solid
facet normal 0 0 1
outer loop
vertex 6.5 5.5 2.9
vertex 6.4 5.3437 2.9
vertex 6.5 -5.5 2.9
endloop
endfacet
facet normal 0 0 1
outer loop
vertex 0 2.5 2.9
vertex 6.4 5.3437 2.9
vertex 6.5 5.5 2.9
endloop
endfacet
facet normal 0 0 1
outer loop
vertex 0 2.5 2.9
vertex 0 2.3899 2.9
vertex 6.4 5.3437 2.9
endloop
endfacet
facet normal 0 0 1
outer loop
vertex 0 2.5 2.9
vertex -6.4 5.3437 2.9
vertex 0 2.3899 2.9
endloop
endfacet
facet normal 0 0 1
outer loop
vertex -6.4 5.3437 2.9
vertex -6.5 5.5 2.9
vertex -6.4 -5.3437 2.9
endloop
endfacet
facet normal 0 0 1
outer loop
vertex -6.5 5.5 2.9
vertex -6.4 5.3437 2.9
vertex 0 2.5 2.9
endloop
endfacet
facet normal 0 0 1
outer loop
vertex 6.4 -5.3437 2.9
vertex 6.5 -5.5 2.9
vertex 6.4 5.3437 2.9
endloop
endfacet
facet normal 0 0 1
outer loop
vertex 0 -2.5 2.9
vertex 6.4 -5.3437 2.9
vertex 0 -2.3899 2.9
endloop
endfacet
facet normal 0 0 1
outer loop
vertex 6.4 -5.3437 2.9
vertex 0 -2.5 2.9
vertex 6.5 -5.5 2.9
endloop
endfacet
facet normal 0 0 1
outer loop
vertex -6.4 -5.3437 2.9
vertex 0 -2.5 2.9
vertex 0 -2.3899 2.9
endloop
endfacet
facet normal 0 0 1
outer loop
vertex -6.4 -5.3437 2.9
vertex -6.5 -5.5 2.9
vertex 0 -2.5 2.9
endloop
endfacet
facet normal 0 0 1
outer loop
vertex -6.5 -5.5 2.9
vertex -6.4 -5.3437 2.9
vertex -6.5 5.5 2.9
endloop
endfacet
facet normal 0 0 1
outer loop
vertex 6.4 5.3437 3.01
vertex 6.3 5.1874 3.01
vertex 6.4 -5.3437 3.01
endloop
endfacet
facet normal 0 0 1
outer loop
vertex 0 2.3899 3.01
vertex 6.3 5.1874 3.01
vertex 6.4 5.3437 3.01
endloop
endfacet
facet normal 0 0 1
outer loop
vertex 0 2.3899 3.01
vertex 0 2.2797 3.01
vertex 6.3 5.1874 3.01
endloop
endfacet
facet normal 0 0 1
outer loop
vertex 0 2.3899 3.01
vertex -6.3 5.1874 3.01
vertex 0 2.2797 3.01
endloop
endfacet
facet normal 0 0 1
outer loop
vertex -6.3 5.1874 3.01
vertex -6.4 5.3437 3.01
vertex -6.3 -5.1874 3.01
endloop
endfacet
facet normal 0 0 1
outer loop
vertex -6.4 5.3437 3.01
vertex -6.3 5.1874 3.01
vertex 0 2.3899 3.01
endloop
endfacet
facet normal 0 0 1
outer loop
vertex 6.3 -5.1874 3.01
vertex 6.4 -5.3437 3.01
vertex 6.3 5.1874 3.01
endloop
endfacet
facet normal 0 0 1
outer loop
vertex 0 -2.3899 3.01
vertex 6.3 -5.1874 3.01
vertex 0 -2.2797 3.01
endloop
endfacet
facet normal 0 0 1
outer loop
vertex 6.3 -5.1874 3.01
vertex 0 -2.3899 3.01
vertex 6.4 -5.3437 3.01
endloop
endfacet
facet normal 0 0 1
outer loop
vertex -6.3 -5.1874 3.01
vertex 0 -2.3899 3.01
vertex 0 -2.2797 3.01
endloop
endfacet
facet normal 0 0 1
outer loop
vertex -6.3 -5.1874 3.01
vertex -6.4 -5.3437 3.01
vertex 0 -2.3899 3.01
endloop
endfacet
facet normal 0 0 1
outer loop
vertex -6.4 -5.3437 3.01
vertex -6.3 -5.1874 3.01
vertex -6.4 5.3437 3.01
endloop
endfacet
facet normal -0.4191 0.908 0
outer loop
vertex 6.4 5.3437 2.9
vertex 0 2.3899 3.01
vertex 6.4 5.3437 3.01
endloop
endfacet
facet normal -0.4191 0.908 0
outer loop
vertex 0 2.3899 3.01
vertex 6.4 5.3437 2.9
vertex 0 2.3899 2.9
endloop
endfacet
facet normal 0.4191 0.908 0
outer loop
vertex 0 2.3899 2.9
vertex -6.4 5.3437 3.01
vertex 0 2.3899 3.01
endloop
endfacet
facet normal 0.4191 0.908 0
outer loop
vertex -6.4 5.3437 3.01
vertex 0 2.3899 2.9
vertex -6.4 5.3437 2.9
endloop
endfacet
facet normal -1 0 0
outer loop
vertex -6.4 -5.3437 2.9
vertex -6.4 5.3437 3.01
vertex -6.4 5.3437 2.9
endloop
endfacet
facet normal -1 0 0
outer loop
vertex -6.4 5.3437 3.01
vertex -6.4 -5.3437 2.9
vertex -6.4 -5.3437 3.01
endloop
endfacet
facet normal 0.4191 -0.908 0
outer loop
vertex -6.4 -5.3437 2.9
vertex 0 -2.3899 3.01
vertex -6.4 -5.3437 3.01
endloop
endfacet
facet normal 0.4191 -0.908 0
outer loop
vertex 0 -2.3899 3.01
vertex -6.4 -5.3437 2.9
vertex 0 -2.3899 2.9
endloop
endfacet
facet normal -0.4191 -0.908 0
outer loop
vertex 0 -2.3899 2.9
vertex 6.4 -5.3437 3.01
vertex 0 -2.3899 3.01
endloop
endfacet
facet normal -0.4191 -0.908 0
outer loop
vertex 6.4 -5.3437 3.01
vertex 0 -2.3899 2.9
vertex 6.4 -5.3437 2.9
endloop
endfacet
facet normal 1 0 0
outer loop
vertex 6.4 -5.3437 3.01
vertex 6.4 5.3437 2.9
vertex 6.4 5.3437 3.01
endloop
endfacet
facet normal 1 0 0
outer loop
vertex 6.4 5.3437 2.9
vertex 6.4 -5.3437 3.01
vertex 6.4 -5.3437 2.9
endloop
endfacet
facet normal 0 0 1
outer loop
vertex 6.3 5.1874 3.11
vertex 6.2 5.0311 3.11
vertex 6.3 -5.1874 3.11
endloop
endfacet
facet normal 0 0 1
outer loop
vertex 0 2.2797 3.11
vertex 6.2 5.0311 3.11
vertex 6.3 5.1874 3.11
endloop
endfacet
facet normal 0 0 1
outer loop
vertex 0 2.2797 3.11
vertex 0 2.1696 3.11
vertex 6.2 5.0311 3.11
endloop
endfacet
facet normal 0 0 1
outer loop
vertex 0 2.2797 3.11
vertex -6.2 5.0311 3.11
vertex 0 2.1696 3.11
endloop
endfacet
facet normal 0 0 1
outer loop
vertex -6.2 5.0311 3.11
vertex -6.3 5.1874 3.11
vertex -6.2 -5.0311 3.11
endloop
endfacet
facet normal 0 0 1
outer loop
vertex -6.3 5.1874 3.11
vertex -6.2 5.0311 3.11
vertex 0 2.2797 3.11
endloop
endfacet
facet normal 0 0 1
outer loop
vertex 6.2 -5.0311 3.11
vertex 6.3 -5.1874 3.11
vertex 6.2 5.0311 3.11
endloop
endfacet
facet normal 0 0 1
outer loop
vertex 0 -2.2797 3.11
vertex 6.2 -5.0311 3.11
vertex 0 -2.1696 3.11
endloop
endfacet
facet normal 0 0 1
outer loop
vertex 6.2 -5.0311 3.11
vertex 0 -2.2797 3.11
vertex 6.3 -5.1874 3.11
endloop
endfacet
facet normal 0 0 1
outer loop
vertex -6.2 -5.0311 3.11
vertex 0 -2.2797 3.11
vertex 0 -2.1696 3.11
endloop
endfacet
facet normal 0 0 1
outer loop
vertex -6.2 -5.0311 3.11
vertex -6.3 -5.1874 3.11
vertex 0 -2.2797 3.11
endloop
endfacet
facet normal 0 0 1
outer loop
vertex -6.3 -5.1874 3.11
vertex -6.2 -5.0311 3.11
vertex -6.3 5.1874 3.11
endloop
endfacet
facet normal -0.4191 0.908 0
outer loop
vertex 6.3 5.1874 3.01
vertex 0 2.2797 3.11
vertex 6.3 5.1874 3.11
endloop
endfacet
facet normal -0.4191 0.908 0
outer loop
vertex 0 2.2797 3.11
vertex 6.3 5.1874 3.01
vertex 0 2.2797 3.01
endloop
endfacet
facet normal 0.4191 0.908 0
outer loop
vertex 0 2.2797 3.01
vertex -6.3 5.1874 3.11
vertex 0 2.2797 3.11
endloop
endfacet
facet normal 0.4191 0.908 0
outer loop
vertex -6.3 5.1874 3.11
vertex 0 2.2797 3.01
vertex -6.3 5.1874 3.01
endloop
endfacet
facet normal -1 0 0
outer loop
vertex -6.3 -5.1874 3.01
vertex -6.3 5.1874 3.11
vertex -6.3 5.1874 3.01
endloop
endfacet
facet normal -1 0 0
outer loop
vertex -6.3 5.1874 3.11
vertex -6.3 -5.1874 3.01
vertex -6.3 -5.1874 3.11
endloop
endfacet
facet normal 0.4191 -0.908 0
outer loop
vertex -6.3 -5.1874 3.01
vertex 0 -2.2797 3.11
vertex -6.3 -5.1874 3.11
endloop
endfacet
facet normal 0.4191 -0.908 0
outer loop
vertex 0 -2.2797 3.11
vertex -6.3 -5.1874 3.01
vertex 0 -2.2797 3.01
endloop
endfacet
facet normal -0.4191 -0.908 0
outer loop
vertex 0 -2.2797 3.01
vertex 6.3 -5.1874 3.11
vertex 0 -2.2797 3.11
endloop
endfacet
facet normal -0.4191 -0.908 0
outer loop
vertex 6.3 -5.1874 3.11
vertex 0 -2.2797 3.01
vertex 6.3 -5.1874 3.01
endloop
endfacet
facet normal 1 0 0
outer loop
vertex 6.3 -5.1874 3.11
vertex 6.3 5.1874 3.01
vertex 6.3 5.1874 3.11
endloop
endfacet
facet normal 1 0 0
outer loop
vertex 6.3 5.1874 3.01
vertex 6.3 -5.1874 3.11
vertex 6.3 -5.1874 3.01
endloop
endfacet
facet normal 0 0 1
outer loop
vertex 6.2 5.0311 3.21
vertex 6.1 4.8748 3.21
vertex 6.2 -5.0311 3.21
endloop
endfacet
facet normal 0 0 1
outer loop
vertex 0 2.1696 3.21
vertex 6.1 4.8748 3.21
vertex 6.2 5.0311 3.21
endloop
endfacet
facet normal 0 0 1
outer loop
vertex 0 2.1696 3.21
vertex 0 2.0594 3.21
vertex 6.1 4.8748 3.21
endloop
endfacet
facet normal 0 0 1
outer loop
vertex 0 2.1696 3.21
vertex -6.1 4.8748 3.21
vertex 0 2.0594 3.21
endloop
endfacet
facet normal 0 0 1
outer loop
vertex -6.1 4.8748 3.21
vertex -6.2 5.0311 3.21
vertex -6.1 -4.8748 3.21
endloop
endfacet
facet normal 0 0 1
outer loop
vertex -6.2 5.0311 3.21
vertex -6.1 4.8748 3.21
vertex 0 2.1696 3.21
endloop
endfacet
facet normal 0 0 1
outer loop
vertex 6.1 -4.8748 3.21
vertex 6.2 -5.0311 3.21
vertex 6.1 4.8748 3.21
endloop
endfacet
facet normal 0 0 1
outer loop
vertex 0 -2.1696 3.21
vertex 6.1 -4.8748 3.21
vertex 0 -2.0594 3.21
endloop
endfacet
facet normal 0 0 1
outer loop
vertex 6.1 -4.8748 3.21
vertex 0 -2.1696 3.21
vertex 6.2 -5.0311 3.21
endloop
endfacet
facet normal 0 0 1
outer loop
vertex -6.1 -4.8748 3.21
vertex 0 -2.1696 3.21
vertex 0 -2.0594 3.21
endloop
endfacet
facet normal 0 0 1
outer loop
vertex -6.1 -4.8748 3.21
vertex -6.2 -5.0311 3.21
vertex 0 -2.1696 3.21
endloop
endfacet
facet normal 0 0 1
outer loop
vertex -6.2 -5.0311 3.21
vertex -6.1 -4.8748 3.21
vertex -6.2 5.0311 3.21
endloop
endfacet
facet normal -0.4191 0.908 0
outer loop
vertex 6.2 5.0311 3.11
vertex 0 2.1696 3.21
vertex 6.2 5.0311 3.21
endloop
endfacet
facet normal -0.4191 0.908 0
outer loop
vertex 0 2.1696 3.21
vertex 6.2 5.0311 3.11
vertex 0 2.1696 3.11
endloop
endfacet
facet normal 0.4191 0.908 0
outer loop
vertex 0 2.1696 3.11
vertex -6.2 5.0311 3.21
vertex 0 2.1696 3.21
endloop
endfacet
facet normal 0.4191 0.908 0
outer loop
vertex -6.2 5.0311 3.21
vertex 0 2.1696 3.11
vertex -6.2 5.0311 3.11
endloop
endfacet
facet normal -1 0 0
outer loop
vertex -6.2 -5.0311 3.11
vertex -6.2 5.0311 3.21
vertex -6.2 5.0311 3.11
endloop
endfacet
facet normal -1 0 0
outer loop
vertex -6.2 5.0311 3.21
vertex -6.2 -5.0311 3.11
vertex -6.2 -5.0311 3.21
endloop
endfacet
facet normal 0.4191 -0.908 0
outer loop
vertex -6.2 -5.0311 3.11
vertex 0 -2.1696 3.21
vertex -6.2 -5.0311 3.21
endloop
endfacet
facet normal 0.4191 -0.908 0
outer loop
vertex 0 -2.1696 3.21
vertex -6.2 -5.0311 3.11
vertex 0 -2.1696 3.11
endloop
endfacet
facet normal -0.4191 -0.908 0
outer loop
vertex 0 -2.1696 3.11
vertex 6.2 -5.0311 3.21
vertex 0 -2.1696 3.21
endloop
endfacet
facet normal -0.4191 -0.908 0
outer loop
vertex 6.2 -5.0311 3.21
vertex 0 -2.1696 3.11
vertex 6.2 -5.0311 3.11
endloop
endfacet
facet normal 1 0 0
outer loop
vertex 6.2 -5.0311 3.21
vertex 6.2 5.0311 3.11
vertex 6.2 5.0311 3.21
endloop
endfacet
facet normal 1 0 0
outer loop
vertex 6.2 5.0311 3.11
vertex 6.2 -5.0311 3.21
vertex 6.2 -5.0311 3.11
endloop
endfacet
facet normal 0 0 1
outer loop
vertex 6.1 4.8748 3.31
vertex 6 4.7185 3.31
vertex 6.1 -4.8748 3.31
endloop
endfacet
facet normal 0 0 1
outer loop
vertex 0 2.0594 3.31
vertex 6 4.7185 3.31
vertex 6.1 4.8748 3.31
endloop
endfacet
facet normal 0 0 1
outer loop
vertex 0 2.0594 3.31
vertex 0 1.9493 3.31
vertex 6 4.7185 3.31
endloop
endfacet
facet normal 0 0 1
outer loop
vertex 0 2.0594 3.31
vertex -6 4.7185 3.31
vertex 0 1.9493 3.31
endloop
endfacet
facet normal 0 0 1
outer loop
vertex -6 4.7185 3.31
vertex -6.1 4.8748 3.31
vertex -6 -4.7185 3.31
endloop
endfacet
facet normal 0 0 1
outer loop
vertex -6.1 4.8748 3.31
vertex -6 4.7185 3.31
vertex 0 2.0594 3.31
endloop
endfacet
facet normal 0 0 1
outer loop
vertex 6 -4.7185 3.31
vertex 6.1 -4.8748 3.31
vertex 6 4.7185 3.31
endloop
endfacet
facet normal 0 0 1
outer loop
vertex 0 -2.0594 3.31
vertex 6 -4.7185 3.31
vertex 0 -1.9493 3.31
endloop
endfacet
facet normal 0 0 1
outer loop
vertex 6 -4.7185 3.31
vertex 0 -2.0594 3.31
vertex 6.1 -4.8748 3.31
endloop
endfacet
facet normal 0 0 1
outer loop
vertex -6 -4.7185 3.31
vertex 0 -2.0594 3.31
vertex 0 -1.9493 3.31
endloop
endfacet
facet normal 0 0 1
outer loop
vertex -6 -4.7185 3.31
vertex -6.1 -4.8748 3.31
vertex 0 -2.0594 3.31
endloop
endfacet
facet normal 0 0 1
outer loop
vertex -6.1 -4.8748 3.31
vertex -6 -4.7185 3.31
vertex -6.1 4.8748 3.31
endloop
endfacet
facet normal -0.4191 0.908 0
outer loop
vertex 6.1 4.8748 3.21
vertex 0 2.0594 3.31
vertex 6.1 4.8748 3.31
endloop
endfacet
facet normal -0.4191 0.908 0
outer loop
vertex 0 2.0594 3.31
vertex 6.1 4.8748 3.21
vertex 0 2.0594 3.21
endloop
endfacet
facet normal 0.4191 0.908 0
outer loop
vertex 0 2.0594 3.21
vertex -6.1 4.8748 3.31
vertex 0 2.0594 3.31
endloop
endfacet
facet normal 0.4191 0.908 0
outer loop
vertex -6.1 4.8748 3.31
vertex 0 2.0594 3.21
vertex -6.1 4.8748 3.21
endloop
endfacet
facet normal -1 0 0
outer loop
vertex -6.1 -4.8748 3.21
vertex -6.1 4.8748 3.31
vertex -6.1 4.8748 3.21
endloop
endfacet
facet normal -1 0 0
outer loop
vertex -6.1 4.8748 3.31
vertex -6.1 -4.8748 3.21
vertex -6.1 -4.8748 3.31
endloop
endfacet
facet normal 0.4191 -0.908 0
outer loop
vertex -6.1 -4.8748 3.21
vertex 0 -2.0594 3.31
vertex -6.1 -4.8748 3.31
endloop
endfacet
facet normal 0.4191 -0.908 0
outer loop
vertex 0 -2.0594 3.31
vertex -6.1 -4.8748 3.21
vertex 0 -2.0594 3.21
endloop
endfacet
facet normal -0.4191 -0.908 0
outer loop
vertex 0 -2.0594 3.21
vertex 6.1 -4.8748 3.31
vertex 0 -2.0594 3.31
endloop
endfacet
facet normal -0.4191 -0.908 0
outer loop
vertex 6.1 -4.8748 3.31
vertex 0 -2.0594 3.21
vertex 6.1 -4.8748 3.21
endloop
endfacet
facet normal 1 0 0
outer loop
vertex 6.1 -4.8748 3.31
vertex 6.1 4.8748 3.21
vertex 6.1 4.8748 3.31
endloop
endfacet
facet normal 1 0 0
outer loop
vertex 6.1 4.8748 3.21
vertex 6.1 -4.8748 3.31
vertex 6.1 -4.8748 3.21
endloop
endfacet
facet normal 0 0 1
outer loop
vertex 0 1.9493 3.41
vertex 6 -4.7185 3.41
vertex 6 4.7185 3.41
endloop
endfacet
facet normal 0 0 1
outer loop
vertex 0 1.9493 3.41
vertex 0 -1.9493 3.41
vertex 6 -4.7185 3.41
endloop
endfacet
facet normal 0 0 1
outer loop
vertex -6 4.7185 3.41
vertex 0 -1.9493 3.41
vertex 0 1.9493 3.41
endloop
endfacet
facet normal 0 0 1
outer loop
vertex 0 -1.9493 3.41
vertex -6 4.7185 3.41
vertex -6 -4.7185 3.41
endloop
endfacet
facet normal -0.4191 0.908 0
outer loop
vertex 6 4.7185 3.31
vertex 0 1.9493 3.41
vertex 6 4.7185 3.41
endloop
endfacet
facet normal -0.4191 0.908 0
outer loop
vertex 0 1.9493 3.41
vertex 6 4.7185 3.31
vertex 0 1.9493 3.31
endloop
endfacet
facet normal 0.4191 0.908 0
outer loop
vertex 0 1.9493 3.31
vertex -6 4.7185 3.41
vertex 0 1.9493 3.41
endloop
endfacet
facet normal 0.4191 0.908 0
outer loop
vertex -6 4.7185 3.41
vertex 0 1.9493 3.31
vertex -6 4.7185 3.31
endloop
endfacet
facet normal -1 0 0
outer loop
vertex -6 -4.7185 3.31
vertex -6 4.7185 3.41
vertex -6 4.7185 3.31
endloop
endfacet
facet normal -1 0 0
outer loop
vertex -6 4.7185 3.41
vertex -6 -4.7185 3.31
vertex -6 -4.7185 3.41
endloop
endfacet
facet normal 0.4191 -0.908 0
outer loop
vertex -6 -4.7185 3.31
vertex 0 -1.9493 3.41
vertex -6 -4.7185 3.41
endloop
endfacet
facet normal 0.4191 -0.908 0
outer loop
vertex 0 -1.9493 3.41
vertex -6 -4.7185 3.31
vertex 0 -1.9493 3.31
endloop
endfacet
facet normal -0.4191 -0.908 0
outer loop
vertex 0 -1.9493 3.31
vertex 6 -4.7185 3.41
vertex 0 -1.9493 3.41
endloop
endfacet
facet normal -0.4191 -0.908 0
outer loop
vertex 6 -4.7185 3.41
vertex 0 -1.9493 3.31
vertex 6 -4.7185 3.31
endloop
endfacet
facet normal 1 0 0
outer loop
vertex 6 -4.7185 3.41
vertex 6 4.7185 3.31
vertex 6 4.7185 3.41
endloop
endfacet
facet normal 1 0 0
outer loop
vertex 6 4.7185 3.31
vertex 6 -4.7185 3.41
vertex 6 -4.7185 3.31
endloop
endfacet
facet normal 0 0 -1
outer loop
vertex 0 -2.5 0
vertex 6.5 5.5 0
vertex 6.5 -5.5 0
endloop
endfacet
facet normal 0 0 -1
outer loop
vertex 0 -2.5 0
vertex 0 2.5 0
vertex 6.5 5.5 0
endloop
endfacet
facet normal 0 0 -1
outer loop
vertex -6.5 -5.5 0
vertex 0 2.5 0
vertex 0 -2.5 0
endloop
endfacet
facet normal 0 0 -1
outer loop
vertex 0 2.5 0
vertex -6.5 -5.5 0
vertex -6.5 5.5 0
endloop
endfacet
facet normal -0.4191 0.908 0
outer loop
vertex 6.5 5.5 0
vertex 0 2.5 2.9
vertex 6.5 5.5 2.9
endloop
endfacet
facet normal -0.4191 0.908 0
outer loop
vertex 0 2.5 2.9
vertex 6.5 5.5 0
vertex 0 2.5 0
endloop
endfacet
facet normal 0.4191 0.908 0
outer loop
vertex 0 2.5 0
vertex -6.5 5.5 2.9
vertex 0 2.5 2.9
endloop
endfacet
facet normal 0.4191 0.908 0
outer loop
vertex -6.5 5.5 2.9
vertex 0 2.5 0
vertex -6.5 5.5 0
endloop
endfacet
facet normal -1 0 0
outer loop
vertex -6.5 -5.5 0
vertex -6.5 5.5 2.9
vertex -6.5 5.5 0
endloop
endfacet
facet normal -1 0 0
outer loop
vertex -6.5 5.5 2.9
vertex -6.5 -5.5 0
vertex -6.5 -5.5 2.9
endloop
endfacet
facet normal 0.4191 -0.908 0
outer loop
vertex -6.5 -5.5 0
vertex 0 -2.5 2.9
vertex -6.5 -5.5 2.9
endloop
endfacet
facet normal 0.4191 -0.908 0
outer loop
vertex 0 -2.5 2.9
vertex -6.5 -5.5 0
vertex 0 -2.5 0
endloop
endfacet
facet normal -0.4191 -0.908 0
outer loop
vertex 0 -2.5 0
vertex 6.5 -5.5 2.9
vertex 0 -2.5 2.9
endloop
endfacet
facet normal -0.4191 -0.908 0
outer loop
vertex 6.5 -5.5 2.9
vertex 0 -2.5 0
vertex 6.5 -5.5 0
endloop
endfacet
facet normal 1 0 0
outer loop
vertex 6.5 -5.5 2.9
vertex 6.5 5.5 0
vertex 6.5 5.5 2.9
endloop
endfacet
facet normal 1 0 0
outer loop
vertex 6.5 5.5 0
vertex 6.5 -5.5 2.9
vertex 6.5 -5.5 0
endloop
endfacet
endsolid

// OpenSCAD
// Bow-tie key for the SKÅDIS tiles (skadis-tile.scad): one per pocket pair, three per
// joint. 13 x 11 x 3.4 mm, dovetail waist 5 mm. Push it into the back of the joint with a
// thumb until the pocket's lip clicks over it; the chamfer on its top edge cams it past
// the lip. Print flat, as saved, PETG, same profile as the tiles. Print spares: 0.7 g each.

key_len = 13; key_neck = 5; key_tip = 11; key_depth = 3.5; cham = 0.5;
h = key_depth - 0.1;
key_poly = [[-key_len / 2, -key_tip / 2], [-key_len / 2, key_tip / 2], [0, key_neck / 2], [key_len / 2, key_tip / 2], [key_len / 2, -key_tip / 2], [0, -key_neck / 2]];
linear_extrude(h - cham) polygon(key_poly);
steps = 5;   // the chamfer as shrinking slices, so the waist is kept (a hull would fill it)
for (i = [0 : steps - 1]) translate([0, 0, h - cham + i * cham / steps]) linear_extrude(cham / steps + 0.01) offset(delta = -cham * (i + 1) / steps) polygon(key_poly);
